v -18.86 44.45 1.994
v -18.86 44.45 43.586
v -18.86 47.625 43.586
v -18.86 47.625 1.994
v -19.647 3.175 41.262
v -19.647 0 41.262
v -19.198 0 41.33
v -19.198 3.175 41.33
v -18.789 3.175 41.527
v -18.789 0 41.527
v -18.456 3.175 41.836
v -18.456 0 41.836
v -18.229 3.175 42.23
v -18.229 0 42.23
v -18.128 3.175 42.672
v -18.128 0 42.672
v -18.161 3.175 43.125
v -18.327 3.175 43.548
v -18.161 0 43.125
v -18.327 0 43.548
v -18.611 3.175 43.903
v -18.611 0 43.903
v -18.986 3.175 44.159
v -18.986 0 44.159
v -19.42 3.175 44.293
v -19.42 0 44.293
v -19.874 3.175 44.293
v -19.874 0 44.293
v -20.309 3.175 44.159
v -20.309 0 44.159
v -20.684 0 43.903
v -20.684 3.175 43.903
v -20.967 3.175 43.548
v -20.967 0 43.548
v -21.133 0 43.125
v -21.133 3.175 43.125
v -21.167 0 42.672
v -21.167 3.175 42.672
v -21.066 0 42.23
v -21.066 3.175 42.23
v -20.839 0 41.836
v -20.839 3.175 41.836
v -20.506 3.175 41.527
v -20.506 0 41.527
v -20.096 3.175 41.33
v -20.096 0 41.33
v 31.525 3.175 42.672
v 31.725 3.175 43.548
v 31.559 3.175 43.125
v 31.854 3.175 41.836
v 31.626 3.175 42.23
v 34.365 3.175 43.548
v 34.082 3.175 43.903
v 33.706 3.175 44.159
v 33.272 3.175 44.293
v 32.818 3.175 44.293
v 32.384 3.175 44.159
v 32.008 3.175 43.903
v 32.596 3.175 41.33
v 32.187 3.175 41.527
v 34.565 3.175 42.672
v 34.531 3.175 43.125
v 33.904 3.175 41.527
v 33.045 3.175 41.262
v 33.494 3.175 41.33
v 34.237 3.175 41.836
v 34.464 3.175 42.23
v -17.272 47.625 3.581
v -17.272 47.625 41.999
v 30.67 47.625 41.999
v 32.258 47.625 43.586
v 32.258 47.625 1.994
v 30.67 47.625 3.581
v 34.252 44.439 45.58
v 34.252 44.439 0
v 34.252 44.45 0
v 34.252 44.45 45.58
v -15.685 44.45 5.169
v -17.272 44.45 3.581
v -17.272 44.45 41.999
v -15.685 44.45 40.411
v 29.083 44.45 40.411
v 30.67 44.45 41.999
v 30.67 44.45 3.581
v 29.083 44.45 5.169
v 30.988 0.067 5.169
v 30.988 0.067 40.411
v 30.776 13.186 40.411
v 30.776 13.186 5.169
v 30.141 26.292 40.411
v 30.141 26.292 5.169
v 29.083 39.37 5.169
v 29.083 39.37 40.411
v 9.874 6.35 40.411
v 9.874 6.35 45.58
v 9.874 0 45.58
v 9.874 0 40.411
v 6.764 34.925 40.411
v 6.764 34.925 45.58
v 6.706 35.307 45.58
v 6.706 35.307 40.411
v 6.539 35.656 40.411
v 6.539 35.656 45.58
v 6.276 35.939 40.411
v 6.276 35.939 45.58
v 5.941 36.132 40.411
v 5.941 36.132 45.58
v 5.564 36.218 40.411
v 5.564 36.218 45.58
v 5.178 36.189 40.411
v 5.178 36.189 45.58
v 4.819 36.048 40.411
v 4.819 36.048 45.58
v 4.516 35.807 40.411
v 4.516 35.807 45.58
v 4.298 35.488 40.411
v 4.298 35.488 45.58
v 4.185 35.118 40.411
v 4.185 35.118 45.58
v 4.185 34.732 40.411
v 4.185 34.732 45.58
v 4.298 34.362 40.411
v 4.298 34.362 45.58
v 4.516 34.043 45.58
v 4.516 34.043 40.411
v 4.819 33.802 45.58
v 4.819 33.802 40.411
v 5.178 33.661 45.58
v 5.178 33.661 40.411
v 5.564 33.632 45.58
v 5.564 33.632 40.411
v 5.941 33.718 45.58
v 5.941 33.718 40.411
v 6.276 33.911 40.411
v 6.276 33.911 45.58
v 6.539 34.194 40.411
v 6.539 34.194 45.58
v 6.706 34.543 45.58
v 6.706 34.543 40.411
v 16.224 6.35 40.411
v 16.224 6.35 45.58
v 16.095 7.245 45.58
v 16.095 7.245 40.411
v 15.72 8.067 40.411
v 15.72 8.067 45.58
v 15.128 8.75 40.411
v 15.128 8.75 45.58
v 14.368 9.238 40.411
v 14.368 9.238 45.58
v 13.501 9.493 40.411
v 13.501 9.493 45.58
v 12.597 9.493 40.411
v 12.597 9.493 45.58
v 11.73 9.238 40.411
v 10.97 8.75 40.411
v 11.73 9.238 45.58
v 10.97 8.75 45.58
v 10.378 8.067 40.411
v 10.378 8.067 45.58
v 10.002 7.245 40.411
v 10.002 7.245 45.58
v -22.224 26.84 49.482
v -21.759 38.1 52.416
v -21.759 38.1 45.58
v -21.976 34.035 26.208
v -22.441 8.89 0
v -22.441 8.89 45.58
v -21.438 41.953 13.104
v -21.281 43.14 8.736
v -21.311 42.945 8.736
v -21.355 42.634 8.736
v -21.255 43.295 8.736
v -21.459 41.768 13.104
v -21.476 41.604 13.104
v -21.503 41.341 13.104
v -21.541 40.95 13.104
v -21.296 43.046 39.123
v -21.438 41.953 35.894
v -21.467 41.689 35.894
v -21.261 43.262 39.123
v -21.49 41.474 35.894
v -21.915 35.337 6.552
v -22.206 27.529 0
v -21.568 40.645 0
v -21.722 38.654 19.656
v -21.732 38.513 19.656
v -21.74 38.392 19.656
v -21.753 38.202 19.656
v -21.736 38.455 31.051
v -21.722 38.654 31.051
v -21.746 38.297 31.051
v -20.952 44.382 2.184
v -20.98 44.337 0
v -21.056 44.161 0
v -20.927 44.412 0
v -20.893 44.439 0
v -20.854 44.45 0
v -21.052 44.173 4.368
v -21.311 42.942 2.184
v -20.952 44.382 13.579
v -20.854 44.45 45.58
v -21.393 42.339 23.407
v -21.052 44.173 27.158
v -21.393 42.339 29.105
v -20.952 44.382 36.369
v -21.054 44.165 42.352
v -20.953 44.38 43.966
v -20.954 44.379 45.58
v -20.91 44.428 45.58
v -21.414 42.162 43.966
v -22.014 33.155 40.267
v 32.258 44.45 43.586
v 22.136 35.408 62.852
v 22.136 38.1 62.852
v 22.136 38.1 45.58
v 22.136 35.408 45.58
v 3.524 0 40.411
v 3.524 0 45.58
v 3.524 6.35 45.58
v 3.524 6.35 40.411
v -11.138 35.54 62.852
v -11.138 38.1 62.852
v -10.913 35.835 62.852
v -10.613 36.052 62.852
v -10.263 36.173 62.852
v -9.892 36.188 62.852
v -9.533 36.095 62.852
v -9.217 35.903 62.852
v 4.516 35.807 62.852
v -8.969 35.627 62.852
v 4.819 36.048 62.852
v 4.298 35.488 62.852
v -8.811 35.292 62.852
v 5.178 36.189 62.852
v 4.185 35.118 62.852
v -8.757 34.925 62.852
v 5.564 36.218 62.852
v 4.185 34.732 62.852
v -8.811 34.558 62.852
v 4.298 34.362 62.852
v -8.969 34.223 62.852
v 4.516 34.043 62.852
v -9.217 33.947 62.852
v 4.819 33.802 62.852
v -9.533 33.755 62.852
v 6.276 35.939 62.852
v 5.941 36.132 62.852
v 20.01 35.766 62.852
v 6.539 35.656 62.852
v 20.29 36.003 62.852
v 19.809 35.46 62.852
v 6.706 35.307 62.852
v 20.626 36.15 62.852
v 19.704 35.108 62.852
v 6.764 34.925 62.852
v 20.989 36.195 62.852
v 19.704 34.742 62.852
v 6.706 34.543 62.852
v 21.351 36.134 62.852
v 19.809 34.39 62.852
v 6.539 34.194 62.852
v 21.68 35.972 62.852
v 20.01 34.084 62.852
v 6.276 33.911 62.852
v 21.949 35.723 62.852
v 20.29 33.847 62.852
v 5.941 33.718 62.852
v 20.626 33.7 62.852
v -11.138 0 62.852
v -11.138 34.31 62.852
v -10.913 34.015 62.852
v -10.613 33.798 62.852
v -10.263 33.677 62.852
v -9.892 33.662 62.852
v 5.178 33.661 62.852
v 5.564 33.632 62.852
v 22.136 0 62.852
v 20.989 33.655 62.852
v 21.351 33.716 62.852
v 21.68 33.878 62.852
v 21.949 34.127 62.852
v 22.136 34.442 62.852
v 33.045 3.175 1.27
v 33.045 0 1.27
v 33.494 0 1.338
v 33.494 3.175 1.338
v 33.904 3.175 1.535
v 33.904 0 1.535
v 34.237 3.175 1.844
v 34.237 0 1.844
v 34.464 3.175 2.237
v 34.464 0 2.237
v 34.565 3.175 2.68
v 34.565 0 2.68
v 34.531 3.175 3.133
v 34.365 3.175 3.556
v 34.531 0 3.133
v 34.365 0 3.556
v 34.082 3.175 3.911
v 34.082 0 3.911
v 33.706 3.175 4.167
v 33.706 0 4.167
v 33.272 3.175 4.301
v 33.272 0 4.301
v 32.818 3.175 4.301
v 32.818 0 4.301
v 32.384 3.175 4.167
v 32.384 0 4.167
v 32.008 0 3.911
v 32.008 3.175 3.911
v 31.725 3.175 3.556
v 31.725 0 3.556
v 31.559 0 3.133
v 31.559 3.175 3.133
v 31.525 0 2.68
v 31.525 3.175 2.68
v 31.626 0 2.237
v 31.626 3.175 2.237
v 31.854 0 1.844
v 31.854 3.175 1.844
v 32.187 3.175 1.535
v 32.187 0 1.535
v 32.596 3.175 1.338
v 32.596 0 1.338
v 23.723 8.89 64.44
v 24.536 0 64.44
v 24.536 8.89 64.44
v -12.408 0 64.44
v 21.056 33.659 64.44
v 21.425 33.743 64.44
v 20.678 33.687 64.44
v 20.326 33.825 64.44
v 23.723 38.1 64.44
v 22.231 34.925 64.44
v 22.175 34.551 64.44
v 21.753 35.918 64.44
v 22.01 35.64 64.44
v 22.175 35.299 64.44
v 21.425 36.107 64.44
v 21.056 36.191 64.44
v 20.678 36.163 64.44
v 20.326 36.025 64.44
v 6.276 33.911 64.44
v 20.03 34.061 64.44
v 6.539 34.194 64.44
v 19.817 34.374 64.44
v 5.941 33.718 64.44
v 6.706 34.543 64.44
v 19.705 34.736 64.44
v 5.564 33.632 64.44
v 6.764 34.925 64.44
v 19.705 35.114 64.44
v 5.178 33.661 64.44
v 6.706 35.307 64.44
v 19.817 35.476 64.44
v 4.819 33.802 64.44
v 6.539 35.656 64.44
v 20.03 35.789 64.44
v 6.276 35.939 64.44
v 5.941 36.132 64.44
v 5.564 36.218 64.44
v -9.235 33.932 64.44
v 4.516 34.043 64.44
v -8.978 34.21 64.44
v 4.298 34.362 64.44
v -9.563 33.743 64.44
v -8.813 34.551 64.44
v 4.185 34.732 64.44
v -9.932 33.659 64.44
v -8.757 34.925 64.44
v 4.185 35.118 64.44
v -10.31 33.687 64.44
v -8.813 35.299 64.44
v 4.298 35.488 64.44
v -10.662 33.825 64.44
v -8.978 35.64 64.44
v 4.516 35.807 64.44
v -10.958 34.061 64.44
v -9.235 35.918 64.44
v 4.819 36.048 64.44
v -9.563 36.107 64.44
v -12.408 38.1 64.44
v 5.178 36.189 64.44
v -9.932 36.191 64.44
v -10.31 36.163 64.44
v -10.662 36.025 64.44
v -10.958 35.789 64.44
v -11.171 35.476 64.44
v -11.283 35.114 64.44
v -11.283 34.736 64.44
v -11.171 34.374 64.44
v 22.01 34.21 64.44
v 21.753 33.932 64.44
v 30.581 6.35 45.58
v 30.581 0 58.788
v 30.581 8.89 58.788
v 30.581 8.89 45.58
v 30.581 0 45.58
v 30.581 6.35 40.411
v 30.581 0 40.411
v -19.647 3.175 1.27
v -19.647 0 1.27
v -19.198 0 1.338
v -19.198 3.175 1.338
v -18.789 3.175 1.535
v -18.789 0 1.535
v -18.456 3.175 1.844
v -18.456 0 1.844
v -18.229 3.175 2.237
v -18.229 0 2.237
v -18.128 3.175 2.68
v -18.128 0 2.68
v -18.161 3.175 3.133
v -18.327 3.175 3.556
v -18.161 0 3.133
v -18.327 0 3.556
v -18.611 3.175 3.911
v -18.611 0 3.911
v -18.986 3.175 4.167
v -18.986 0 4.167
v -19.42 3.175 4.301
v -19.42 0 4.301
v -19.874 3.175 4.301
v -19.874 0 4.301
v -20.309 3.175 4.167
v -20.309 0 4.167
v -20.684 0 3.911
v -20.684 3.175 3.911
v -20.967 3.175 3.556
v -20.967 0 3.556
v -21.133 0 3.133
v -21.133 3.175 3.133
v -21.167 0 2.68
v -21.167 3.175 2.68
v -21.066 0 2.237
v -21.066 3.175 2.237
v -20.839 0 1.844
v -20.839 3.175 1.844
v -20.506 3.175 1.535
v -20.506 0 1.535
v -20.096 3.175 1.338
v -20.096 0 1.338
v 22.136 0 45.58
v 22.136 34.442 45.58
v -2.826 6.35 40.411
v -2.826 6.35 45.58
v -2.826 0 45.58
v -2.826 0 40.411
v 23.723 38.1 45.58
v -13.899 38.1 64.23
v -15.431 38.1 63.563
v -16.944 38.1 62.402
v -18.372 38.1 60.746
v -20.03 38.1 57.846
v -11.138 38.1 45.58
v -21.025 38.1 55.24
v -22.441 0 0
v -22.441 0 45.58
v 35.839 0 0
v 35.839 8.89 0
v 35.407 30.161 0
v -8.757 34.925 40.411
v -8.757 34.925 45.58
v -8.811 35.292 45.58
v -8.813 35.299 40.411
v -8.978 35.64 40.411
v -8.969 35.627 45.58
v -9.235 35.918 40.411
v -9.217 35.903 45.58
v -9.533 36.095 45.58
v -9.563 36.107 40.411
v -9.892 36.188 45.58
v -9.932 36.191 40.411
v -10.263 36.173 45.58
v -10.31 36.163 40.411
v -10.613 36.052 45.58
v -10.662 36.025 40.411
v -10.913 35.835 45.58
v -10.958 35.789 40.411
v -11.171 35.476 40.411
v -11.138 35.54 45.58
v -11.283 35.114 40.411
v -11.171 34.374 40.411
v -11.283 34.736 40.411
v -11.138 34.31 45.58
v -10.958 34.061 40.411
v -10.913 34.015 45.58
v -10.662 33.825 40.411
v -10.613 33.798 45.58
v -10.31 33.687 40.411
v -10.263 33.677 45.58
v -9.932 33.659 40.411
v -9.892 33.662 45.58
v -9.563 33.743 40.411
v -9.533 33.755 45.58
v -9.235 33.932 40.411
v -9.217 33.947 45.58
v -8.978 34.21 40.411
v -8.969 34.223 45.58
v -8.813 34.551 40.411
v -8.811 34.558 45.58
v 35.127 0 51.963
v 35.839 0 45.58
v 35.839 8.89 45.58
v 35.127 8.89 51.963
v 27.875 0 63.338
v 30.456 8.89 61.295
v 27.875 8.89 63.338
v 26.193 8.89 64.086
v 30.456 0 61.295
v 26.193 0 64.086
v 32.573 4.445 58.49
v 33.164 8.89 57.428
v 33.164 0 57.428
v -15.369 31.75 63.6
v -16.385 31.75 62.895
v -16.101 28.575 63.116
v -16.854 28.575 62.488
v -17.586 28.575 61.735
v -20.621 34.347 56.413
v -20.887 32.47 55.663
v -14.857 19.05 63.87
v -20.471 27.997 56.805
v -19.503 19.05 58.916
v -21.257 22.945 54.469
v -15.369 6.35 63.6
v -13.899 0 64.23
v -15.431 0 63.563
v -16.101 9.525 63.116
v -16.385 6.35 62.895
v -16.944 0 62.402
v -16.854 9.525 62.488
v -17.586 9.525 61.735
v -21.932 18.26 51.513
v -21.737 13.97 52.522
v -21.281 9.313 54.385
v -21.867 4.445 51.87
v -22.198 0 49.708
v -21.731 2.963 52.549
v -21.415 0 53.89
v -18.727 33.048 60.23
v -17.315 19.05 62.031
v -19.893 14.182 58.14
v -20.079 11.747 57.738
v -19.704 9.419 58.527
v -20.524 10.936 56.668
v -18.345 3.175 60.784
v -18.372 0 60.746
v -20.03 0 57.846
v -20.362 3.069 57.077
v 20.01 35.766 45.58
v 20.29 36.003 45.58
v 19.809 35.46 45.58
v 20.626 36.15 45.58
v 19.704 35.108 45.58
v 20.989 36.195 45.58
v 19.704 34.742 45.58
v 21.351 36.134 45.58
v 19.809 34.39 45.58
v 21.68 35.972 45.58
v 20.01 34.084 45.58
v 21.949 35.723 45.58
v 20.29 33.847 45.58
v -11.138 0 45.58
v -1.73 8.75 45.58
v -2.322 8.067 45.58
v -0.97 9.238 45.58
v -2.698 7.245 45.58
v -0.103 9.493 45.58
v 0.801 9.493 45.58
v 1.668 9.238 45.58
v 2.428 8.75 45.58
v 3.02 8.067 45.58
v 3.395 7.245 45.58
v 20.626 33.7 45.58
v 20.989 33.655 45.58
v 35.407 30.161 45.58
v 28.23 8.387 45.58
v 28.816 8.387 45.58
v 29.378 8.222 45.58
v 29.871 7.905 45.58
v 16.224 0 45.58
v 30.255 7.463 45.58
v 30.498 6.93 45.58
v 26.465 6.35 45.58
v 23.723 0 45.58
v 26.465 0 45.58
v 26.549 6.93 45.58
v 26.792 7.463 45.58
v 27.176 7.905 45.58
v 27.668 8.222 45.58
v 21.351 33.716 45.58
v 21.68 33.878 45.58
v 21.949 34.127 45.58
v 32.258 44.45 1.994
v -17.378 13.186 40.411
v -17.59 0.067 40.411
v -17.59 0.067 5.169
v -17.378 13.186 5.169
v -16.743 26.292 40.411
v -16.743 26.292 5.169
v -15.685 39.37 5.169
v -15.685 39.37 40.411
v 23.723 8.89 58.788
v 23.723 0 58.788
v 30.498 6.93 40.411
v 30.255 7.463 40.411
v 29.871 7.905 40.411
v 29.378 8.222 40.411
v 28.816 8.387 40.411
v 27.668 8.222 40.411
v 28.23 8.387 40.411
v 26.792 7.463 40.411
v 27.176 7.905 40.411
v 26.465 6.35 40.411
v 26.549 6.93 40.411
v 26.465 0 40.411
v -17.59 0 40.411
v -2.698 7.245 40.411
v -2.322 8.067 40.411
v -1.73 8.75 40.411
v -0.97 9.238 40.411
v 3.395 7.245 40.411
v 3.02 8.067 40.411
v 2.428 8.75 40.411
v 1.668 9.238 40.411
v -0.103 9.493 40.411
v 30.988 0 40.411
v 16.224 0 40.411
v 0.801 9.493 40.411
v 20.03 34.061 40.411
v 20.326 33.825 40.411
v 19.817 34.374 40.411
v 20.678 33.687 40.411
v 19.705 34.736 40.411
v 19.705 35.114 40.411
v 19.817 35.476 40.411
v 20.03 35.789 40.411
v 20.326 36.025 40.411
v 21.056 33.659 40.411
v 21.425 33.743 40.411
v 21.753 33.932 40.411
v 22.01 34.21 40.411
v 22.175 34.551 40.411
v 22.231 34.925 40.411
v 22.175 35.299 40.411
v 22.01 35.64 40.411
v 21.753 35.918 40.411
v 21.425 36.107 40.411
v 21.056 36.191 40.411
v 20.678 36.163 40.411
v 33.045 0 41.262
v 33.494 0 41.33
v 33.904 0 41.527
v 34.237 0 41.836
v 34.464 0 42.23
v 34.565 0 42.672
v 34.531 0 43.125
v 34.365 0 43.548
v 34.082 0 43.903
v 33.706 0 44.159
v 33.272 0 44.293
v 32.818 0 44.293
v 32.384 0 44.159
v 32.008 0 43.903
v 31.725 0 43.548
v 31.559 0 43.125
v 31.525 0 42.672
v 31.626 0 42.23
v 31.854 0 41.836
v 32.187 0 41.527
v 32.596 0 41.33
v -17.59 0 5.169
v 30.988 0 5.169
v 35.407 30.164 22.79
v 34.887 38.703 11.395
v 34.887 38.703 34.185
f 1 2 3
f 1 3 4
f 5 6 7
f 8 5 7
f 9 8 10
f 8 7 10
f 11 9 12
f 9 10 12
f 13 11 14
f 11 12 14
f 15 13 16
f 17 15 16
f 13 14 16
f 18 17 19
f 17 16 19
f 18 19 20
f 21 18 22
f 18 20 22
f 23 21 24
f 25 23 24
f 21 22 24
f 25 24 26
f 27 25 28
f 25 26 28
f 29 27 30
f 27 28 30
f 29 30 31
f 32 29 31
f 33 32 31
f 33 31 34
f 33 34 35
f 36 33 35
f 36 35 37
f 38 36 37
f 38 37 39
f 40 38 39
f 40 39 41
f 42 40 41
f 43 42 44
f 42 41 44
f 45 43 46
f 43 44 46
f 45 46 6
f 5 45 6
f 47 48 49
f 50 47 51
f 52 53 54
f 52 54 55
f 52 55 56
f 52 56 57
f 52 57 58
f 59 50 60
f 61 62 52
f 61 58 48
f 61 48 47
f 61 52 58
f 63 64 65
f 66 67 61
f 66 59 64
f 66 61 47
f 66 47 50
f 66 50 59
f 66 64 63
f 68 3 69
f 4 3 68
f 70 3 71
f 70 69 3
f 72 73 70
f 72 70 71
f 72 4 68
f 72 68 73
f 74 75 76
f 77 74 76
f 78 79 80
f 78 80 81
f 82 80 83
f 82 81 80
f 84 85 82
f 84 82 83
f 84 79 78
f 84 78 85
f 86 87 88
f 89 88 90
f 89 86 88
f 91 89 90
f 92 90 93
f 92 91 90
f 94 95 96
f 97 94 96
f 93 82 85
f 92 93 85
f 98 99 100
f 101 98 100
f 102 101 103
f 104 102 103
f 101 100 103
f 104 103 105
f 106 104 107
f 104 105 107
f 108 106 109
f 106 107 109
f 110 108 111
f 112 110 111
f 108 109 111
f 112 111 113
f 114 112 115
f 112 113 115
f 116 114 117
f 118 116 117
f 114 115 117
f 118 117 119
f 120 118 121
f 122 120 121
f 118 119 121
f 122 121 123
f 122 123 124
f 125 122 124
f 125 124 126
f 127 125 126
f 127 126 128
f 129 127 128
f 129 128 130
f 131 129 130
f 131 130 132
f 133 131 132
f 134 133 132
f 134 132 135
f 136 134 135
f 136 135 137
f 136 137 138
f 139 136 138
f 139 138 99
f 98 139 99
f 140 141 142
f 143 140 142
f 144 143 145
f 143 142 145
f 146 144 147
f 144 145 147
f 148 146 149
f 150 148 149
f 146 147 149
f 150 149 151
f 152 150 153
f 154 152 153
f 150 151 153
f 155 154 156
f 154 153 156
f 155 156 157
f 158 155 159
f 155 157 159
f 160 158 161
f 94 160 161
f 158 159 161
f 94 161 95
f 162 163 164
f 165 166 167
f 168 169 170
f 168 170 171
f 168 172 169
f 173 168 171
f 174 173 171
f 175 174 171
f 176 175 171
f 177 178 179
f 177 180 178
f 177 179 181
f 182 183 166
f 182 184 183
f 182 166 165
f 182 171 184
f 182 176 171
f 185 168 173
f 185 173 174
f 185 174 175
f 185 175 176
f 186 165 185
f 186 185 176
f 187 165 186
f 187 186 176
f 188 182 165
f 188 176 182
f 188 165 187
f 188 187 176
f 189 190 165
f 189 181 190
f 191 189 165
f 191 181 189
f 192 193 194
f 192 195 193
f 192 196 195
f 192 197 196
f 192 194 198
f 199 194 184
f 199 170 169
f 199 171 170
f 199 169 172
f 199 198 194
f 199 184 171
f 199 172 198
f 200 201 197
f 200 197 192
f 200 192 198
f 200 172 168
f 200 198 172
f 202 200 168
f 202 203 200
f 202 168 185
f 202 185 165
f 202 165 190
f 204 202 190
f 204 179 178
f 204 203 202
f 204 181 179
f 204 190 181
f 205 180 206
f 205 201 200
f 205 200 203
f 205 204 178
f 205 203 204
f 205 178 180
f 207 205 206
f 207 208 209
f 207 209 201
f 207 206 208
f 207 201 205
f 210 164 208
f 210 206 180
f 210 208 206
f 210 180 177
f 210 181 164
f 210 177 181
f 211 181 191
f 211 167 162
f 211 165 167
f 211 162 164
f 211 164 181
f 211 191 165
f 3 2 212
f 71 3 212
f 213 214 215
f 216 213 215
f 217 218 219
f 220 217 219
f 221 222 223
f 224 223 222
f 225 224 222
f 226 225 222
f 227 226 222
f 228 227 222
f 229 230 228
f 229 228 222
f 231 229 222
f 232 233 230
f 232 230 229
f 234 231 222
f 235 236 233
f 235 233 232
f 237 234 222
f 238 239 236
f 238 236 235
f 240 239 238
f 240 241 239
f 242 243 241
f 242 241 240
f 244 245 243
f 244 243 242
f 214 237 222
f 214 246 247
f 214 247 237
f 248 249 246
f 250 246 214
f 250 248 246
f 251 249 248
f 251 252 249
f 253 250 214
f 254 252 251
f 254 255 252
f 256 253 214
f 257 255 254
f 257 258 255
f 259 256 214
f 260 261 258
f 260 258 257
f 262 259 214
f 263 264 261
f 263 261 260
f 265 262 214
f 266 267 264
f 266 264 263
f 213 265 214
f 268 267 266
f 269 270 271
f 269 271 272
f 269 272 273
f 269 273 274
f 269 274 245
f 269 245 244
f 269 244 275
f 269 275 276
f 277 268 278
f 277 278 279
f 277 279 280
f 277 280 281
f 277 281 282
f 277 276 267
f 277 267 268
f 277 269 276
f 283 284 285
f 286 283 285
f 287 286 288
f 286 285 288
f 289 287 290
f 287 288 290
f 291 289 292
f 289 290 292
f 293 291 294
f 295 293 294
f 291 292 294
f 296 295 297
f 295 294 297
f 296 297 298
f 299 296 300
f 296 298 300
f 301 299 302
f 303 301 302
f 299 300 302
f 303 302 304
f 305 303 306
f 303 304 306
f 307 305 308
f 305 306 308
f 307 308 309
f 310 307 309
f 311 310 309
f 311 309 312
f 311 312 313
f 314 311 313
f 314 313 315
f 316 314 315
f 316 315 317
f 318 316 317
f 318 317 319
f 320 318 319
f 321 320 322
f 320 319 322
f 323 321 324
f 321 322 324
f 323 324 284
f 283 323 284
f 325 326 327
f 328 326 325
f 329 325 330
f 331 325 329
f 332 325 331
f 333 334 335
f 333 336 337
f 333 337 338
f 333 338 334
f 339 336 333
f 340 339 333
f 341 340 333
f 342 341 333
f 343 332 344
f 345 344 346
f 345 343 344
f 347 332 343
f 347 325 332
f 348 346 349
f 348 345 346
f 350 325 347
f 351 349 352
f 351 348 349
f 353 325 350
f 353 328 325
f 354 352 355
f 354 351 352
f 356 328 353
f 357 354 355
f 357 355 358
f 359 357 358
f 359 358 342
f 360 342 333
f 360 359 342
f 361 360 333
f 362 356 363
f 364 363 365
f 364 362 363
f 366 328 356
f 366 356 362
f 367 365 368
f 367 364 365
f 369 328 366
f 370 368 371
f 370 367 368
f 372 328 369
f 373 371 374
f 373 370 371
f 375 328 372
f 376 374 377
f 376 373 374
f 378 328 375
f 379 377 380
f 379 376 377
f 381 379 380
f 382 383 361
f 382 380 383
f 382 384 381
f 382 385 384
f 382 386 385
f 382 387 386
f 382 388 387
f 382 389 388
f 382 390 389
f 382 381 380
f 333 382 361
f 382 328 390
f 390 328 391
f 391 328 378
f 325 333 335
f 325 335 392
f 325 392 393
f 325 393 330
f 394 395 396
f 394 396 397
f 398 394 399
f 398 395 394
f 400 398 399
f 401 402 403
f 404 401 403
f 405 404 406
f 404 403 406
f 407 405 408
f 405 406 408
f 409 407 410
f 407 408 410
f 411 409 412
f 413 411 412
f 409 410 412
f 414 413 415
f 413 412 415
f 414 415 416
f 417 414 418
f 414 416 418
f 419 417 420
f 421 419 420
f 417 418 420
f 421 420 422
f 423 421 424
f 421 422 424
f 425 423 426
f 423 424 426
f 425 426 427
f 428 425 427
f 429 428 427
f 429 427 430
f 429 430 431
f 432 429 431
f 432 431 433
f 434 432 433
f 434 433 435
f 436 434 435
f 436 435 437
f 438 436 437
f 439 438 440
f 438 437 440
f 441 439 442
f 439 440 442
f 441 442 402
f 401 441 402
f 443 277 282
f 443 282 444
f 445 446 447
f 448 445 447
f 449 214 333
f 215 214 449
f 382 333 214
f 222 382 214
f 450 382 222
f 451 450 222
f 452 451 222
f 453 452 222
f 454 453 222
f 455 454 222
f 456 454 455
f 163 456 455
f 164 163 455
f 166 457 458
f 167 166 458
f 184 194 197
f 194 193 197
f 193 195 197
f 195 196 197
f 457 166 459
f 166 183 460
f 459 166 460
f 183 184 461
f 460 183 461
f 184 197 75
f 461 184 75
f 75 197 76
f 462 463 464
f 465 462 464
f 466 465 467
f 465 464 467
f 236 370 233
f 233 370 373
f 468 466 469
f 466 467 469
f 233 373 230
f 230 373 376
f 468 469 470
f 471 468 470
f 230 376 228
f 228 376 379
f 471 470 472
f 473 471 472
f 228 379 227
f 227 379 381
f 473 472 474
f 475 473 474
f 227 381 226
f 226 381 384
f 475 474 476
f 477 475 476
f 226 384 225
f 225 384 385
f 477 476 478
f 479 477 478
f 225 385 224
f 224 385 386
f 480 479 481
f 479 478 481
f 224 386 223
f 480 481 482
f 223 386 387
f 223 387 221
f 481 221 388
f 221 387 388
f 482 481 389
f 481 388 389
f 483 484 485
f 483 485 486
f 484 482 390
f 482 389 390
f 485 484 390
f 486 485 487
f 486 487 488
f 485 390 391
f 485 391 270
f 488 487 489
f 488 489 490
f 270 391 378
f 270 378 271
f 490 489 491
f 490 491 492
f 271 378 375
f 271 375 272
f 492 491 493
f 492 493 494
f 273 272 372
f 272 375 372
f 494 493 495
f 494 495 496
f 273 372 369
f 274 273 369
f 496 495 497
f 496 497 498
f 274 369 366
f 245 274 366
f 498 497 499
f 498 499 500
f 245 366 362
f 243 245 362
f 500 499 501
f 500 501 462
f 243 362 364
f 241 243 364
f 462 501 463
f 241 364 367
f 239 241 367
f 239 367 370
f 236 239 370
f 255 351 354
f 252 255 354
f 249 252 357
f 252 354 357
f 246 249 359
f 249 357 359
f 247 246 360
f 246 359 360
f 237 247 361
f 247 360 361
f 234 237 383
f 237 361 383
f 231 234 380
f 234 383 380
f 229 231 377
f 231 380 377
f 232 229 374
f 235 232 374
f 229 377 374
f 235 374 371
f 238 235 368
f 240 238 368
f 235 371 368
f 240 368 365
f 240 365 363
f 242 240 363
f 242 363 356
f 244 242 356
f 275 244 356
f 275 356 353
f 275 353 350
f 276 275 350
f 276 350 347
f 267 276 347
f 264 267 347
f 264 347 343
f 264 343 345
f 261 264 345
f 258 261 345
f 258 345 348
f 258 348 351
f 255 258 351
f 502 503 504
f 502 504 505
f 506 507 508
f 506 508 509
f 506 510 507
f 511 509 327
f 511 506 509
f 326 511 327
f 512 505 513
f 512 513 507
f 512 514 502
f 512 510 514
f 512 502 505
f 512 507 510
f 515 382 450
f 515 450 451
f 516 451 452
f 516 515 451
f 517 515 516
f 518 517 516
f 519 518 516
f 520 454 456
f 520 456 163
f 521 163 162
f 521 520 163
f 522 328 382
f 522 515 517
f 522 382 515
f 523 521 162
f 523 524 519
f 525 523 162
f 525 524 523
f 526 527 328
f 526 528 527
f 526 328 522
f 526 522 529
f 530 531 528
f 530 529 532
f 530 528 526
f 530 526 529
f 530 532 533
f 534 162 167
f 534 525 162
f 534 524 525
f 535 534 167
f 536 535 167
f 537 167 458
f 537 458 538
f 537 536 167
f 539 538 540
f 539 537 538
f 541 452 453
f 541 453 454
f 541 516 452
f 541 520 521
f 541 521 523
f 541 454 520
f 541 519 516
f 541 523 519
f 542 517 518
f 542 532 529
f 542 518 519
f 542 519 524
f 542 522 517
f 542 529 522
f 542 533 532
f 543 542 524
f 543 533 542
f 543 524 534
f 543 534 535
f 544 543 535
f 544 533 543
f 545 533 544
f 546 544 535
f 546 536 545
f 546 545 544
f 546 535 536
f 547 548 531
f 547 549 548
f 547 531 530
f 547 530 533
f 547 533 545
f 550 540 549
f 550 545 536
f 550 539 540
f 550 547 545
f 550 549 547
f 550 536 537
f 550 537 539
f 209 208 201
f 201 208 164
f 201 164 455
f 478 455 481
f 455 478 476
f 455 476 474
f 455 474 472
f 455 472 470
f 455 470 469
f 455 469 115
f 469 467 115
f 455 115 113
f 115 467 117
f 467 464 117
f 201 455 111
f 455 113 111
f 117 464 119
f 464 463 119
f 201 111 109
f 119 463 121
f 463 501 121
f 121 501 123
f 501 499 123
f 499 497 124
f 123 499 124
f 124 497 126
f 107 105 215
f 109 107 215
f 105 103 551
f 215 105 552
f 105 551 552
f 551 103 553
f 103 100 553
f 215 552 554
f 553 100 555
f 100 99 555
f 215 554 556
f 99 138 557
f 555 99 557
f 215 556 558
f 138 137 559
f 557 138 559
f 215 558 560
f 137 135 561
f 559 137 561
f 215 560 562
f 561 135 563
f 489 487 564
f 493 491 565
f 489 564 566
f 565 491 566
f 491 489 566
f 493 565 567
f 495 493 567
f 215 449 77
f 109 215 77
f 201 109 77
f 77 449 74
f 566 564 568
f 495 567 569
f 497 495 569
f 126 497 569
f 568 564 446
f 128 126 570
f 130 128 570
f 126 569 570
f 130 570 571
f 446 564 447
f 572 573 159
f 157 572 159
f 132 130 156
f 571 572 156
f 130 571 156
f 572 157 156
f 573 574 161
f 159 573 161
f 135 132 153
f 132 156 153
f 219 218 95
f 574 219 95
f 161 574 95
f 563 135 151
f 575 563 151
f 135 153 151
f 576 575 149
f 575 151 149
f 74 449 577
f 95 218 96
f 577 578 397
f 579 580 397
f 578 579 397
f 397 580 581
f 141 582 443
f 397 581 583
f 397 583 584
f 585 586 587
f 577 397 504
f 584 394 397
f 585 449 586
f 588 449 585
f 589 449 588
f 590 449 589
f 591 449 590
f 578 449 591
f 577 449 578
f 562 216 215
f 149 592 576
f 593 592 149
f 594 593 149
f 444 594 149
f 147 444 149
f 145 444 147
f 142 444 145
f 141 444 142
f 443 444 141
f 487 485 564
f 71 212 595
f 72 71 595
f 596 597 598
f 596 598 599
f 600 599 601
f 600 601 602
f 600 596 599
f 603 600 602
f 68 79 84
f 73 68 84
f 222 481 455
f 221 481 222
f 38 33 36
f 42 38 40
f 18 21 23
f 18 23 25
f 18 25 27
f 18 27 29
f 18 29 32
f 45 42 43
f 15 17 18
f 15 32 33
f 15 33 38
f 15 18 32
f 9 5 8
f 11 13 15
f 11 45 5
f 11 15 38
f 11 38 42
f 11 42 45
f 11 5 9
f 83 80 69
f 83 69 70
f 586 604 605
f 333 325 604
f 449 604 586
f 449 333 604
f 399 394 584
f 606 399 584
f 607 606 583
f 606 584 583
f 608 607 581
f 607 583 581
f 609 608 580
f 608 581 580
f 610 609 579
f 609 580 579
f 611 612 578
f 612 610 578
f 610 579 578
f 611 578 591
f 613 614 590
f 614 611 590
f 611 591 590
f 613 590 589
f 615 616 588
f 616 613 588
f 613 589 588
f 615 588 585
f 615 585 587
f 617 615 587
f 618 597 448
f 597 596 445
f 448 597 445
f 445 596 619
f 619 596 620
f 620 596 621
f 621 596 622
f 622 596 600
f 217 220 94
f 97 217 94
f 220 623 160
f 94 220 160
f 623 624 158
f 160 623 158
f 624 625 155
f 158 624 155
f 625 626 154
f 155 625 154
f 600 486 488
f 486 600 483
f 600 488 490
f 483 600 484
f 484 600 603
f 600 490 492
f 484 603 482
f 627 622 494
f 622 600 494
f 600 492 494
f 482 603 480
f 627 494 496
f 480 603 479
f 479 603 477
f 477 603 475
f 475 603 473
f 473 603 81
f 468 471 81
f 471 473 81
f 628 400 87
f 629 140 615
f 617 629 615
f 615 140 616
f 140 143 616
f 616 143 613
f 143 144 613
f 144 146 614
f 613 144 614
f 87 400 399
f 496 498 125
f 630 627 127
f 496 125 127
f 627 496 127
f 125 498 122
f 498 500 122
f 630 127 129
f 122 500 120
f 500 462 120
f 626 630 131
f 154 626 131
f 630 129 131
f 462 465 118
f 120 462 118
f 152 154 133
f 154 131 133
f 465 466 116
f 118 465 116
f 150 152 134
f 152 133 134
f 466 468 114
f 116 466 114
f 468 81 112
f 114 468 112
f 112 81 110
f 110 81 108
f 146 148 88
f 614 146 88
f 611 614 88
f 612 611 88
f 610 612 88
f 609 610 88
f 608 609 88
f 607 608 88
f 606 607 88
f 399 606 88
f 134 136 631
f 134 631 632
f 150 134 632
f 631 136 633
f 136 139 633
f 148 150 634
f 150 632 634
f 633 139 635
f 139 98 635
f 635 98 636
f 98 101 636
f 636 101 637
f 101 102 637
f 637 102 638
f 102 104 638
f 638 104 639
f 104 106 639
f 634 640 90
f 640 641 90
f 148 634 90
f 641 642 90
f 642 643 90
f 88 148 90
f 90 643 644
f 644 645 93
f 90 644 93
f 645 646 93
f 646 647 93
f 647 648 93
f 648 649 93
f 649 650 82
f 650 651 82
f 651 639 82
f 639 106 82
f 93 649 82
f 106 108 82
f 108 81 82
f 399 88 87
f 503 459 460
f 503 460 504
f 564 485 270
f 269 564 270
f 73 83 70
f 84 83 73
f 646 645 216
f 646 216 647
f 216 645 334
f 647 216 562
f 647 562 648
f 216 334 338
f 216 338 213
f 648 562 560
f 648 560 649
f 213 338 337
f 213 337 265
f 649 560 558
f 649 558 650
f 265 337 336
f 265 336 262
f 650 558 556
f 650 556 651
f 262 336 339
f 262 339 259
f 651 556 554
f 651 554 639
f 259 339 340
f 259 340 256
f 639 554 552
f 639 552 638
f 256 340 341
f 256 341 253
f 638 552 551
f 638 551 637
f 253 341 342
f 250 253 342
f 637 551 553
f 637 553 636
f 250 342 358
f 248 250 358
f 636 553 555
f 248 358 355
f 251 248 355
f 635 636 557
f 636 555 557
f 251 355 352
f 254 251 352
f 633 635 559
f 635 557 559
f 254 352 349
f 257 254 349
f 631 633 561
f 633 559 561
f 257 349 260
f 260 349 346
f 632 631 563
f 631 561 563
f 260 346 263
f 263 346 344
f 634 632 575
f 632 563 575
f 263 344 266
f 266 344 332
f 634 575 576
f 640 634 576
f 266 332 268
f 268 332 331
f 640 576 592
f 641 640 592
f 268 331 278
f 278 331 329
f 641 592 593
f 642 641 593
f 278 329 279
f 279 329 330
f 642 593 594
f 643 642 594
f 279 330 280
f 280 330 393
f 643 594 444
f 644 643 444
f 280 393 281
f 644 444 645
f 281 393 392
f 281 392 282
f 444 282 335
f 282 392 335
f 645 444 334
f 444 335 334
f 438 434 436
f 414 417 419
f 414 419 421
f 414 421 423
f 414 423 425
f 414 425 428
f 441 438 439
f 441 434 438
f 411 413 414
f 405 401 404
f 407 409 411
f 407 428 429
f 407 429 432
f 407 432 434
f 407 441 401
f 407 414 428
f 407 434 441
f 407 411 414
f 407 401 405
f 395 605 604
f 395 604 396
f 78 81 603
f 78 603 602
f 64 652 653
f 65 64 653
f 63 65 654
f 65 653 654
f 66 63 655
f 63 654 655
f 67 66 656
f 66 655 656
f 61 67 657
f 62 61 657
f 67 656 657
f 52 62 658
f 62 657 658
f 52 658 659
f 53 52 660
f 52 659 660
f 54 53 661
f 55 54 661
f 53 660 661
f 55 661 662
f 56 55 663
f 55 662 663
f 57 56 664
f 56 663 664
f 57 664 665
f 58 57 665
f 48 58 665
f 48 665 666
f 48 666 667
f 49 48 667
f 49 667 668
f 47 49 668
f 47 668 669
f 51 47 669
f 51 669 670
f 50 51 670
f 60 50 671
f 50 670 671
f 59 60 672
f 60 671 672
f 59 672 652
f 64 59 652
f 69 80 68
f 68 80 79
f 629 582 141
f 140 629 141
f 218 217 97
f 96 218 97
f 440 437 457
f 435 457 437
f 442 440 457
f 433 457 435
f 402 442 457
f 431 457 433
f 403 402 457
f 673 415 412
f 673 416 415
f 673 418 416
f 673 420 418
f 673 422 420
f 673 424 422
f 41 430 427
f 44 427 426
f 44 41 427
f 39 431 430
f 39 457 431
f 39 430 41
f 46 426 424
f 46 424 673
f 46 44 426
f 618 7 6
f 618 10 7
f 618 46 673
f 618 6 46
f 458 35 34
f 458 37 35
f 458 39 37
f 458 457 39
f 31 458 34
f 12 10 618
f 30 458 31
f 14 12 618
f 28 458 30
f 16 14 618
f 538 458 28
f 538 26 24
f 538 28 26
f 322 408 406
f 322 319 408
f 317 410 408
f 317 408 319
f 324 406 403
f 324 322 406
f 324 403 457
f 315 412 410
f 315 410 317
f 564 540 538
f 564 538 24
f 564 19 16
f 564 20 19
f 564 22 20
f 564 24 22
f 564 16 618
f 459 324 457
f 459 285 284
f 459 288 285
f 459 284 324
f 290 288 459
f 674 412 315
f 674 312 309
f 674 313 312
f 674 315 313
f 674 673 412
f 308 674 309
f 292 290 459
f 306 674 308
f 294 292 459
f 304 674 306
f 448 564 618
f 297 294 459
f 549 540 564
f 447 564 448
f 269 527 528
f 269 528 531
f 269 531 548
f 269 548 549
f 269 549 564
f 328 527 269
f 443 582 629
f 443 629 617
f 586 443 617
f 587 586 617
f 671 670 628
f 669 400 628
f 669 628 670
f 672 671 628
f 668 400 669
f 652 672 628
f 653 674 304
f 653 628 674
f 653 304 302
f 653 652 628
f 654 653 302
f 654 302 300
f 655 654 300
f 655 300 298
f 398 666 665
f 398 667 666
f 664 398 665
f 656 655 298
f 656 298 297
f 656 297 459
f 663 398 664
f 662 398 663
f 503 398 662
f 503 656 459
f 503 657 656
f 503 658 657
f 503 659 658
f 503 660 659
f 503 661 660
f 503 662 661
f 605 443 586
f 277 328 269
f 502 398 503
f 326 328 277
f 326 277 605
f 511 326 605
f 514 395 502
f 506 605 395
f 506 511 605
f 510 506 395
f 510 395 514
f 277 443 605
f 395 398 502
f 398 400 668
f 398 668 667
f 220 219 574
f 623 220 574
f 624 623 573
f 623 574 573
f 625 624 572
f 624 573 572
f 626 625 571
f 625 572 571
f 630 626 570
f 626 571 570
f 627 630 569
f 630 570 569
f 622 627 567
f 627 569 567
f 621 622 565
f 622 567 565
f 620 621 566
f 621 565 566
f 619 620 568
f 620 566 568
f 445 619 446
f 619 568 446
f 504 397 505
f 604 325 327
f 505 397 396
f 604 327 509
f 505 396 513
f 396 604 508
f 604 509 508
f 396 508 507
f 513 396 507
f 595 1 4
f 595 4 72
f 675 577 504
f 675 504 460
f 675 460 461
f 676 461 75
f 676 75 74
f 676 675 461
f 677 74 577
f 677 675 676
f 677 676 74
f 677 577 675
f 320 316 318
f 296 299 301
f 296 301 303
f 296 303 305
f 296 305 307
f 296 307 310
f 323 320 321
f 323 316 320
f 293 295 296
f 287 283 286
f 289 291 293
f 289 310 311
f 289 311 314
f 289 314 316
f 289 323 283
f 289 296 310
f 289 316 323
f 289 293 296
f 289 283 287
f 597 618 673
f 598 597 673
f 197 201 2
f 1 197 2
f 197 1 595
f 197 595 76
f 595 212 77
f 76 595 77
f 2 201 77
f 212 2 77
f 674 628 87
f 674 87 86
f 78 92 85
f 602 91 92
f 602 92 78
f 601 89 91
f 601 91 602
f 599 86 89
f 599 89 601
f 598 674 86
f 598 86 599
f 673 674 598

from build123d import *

# Parameters (mm, degrees)
SKETCH3_W            = 55.1053
SKETCH3_H            = 45.5803
BOSS_EXTRUDE2_DEPTH  = 44.45
SKETCH11_W           = 51.1175
SKETCH11_H           = 41.5925
SKETCH11_W_2         = 47.9425
SKETCH11_H_2         = 38.4175
BOSS_EXTRUDE3_DEPTH  = 3.175
SKETCH13_W           = 44.7675
SKETCH13_H           = 35.2425
CUT_EXTRUDE3_DEPTH   = 73.294764944
CUT_EXTRUDE4_DEPTH   = 5.1689
SKETCH19_W           = 1.5875
SKETCH19_H           = 45.5803
BOSS_EXTRUDE4_DEPTH  = 44.45
SKETCH21_W           = 1.905
SKETCH21_H           = 35.2425
CUT_EXTRUDE5_DEPTH   = 39.37
FILLET1_R            = 406.4
FILLET2_R            = 406.4
SKETCH22_R           = 1.524
CUT_EXTRUDE7_DEPTH   = 3.175
BOSS_EXTRUDE5_DEPTH  = 38.1
SKETCH39_R           = 1.296908885
SKETCH39_R_2         = 1.27
CUT_EXTRUDE14_DEPTH  = 25.4
BOSS_EXTRUDE22_DEPTH = 8.89
CUT_EXTRUDE15_DEPTH  = 88.778493945
SKETCH48_W           = 18.8595
SKETCH48_H           = 29.21
BOSS_EXTRUDE23_DEPTH = 1.5875
SKETCH52_R           = 1.27
CUT_EXTRUDE16_DEPTH  = 25.4


with BuildPart() as part:
    # Sketch3 → Boss-Extrude2 (new body)
    with BuildSketch(Plane(origin=(0, 0, 0), x_dir=(1, 0, 0), z_dir=(0, 1, 0))):
        with Locations((6.69887245, -22.79015)):
            Rectangle(SKETCH3_W, SKETCH3_H)
    extrude(amount=BOSS_EXTRUDE2_DEPTH)

    # Sketch11 → Boss-Extrude3 (add)
    with BuildSketch(Plane(origin=(0, 44.45, 0), x_dir=(1, 0, 0), z_dir=(0, 1, 0))):
        with Locations((6.69887245, -22.79015)):
            Rectangle(SKETCH11_W, SKETCH11_H)
        with Locations((6.69887245, -22.79015)):
            Rectangle(SKETCH11_W_2, SKETCH11_H_2, mode=Mode.SUBTRACT)
    extrude(amount=BOSS_EXTRUDE3_DEPTH)

    # Sketch13 → Cut-Extrude3 (cut, through all)
    with BuildSketch(Plane(origin=(0, 44.45, 0), x_dir=(1, 0, 0), z_dir=(0, 1, 0))):
        with Locations((6.69887245, -22.79015)):
            Rectangle(SKETCH13_W, SKETCH13_H)
    extrude(amount=-CUT_EXTRUDE3_DEPTH, mode=Mode.SUBTRACT)

    # Sketch14 → Cut-Extrude4 (cut)
    with BuildSketch(Plane.XY.offset(45.5803)):
        with BuildLine():
            Line((-2.82612755, 6.35), (-2.82612755, 0))
            Line((-2.82612755, 0), (3.52387245, 0))
            Line((3.52387245, 0), (3.52387245, 6.35))
            ThreePointArc((3.52387245, 6.35), (0.34887245, 9.525), (-2.82612755, 6.35))
        make_face()
        with BuildLine():
            Line((9.87387245, 6.35), (9.87387245, 0))
            Line((9.87387245, 0), (16.22387245, 0))
            Line((16.22387245, 0), (16.22387245, 6.35))
            ThreePointArc((16.22387245, 6.35), (13.04887245, 9.525), (9.87387245, 6.35))
        make_face()
        with BuildLine():
            Line((26.465313364, 0), (30.581222486, 0))
            Line((30.581222486, 0), (30.581222486, 6.35))
            ThreePointArc((30.581222486, 6.35), (28.523267925, 8.407954561), (26.465313364, 6.35))
            Line((26.465313364, 6.35), (26.465313364, 0))
        make_face()
    extrude(amount=-CUT_EXTRUDE4_DEPTH, mode=Mode.SUBTRACT)

    # Sketch19 → Boss-Extrude4 (add)
    with BuildSketch(Plane.XZ):
        with Locations((-21.64752755, 22.79015)):
            Rectangle(SKETCH19_W, SKETCH19_H)
        with Locations((35.04527245, 22.79015)):
            Rectangle(SKETCH19_W, SKETCH19_H)
    extrude(amount=-BOSS_EXTRUDE4_DEPTH)

    # Sketch21 → Cut-Extrude5 (cut)
    with BuildSketch(Plane(origin=(0, 0, 0), x_dir=(-1, 0, 0), z_dir=(0, -1, 0))):
        with Locations((16.63737755, -22.79015)):
            Rectangle(SKETCH21_W, SKETCH21_H)
        with Locations((-30.03512245, -22.79015)):
            Rectangle(SKETCH21_W, SKETCH21_H)
    extrude(amount=-CUT_EXTRUDE5_DEPTH, mode=Mode.SUBTRACT)

    # Fillet1
    # the kernel refuses this fillet: 406.4 mm, written as the material it adds along each edge
    with BuildSketch(Plane(origin=(-17.58987755, 39.37, 40.4114), x_dir=(0, -1, 0), z_dir=(0, 0, -1))) as fillet1_piece_1:
        with BuildLine():
            CenterArc((39.303371039, -406.4), FILLET1_R, 90, 5.549809332)
            Line((0, -1.905), (0, 0))
            Line((0, 0), (39.303371039, 0))
        make_face()
    extrude(amount=35.2425)

    # Fillet2
    # the kernel refuses this fillet: 406.4 mm, written as the material it adds along each edge
    with BuildSketch(Plane(origin=(30.98762245, 39.37, -93.089527597), x_dir=(-1, 0, 0), z_dir=(0, 0, 1))) as fillet2_piece_1_section:
        with BuildLine():
            CenterArc((406.4, 39.303371039), FILLET2_R, 180, 5.549809332)
            Line((0, 39.303371039), (0, 0))
            Line((0, 0), (1.905, 0))
        make_face()
    fillet2_piece_1 = extrude(amount=231.759355193, mode=Mode.PRIVATE)
    fillet2_piece_1 = split(fillet2_piece_1, bisect_by=Plane(origin=(30.98762245, 39.37, 45.5803), z_dir=(0, 0, -1)), keep=Keep.TOP, mode=Mode.PRIVATE)
    fillet2_piece_1 = split(fillet2_piece_1, bisect_by=Plane(origin=(30.98762245, 39.37, 0), z_dir=(0, 0, 1)), keep=Keep.TOP, mode=Mode.PRIVATE)
    add(fillet2_piece_1)

    # Sketch22 → Cut-Extrude7 (cut)
    with BuildSketch(Plane.XZ):
        with Locations(Location((-19.64727755, 42.7863, 0), (0, 0, 270))):
            Circle(SKETCH22_R)
        with Locations(Location((33.04502245, 42.7863, 0), (0, 0, 270))):
            Circle(SKETCH22_R)
        with Locations(Location((-19.64727755, 2.794, 0), (0, 0, 270))):
            Circle(SKETCH22_R)
        with Locations(Location((33.04502245, 2.794, 0), (0, 0, 270))):
            Circle(SKETCH22_R)
    extrude(amount=-CUT_EXTRUDE7_DEPTH, mode=Mode.SUBTRACT)

    # Sketch23 → Boss-Extrude5 (add)
    with BuildSketch(Plane.XZ):
        with BuildLine():
            Line((22.13572245, 62.8523), (22.13572245, 64.4398))
            Line((22.13572245, 64.4398), (21.379894456, 64.4398))
            Line((21.379894456, 64.4398), (-12.40827755, 64.4398))
            add(Edge.make_bspline(
                [(-12.40827755, 64.4398), (-22.44127755, 64.4398), (-22.44127755, 45.5803)],
                knots=[0, 0, 0, 1.570796327, 1.570796327, 1.570796327], degree=2, weights=[1, 0.707106781, 1]))
            Line((-22.44127755, 45.5803), (-11.13827755, 45.5803))
            Line((-11.13827755, 45.5803), (-11.13827755, 58.170091836))
            Line((-11.13827755, 58.170091836), (-11.13827755, 62.8523))
            Line((-11.13827755, 62.8523), (22.13572245, 62.8523))
        make_face()
    extrude(amount=-BOSS_EXTRUDE5_DEPTH)

    # Sketch39 → Cut-Extrude14 (cut)
    with BuildSketch(Plane.XY.offset(64.4398)):
        with Locations((5.46697245, 34.925)):
            Circle(SKETCH39_R)
        with Locations((-10.02702755, 34.925)):
            Circle(SKETCH39_R_2)
        with Locations((20.96097245, 34.925)):
            Circle(SKETCH39_R_2)
    extrude(amount=-CUT_EXTRUDE14_DEPTH, mode=Mode.SUBTRACT)

    # Sketch43 → Boss-Extrude22 (add)
    with BuildSketch(Plane.XZ):
        with BuildLine():
            Line((30.58122245, 45.5803), (35.83902245, 45.5803))
            add(Edge.make_bspline(
                [(35.83902245, 45.5803), (35.83902245, 63.254133988), (24.53602245, 64.4398)],
                knots=[4.71238898, 4.71238898, 4.71238898, 6.216048931, 6.216048931, 6.216048931], degree=2, weights=[1, 0.730440262, 1]))
            Line((24.53602245, 64.4398), (22.13572245, 64.4398))
            Line((22.13572245, 64.4398), (22.13572245, 45.5803))
            Line((22.13572245, 45.5803), (23.72322245, 45.5803))
            Line((23.72322245, 45.5803), (23.72322245, 58.7883))
            Line((23.72322245, 58.7883), (30.58122245, 58.7883))
            Line((30.58122245, 58.7883), (30.58122245, 45.5803))
        make_face()
    extrude(amount=-BOSS_EXTRUDE22_DEPTH)

    # Sketch51 → Cut-Extrude15 (cut, through all)
    with BuildSketch(Plane.XY.offset(64.4398)):
        with BuildLine():
            add(Edge.make_bspline(
                [(-20.85377755, 44.45), (-22.44127755, 44.45), (-22.44127755, 8.89)],
                knots=[3.141592654, 3.141592654, 3.141592654, 4.71238898, 4.71238898, 4.71238898], degree=2, weights=[1, 0.707106781, 1]))
            Line((-22.44127755, 8.89), (-23.728758276, 8.89))
            Line((-23.728758276, 8.89), (-23.728758276, 45.620970636))
            Line((-23.728758276, 45.620970636), (-20.85377755, 45.620970636))
            Line((-20.85377755, 45.620970636), (-20.85377755, 44.45))
        make_face()
        with BuildLine():
            add(Edge.make_bspline(
                [(35.83902245, 8.89), (35.83902245, 34.352534387), (34.251533964, 44.439253731)],
                knots=[4.71238898, 4.71238898, 4.71238898, 5.875876601, 5.875876601, 5.875876601], degree=2, weights=[1, 0.835505729, 1]))
            Line((34.251533964, 44.439253731), (34.25152245, 44.45))
            Line((34.25152245, 44.45), (34.25152245, 45.620970636))
            Line((34.25152245, 45.620970636), (37.555875031, 45.620970636))
            Line((37.555875031, 45.620970636), (37.555875031, 8.89))
            Line((37.555875031, 8.89), (35.83902245, 8.89))
        make_face()
    extrude(amount=-CUT_EXTRUDE15_DEPTH, mode=Mode.SUBTRACT)

    # Sketch48 → Boss-Extrude23 (add)
    with BuildSketch(Plane(origin=(22.13572245, 0, 0), x_dir=(0, 0, -1), z_dir=(1, 0, 0))):
        with Locations((-55.01005, 23.495)):
            Rectangle(SKETCH48_W, SKETCH48_H)
    extrude(amount=BOSS_EXTRUDE23_DEPTH)

    # Sketch52 → Cut-Extrude16 (cut)
    with BuildSketch(Plane.XY.offset(64.4398)):
        with Locations((20.96097245, 34.925)):
            Circle(SKETCH52_R)
    extrude(amount=-CUT_EXTRUDE16_DEPTH, mode=Mode.SUBTRACT)


solid = part.part
